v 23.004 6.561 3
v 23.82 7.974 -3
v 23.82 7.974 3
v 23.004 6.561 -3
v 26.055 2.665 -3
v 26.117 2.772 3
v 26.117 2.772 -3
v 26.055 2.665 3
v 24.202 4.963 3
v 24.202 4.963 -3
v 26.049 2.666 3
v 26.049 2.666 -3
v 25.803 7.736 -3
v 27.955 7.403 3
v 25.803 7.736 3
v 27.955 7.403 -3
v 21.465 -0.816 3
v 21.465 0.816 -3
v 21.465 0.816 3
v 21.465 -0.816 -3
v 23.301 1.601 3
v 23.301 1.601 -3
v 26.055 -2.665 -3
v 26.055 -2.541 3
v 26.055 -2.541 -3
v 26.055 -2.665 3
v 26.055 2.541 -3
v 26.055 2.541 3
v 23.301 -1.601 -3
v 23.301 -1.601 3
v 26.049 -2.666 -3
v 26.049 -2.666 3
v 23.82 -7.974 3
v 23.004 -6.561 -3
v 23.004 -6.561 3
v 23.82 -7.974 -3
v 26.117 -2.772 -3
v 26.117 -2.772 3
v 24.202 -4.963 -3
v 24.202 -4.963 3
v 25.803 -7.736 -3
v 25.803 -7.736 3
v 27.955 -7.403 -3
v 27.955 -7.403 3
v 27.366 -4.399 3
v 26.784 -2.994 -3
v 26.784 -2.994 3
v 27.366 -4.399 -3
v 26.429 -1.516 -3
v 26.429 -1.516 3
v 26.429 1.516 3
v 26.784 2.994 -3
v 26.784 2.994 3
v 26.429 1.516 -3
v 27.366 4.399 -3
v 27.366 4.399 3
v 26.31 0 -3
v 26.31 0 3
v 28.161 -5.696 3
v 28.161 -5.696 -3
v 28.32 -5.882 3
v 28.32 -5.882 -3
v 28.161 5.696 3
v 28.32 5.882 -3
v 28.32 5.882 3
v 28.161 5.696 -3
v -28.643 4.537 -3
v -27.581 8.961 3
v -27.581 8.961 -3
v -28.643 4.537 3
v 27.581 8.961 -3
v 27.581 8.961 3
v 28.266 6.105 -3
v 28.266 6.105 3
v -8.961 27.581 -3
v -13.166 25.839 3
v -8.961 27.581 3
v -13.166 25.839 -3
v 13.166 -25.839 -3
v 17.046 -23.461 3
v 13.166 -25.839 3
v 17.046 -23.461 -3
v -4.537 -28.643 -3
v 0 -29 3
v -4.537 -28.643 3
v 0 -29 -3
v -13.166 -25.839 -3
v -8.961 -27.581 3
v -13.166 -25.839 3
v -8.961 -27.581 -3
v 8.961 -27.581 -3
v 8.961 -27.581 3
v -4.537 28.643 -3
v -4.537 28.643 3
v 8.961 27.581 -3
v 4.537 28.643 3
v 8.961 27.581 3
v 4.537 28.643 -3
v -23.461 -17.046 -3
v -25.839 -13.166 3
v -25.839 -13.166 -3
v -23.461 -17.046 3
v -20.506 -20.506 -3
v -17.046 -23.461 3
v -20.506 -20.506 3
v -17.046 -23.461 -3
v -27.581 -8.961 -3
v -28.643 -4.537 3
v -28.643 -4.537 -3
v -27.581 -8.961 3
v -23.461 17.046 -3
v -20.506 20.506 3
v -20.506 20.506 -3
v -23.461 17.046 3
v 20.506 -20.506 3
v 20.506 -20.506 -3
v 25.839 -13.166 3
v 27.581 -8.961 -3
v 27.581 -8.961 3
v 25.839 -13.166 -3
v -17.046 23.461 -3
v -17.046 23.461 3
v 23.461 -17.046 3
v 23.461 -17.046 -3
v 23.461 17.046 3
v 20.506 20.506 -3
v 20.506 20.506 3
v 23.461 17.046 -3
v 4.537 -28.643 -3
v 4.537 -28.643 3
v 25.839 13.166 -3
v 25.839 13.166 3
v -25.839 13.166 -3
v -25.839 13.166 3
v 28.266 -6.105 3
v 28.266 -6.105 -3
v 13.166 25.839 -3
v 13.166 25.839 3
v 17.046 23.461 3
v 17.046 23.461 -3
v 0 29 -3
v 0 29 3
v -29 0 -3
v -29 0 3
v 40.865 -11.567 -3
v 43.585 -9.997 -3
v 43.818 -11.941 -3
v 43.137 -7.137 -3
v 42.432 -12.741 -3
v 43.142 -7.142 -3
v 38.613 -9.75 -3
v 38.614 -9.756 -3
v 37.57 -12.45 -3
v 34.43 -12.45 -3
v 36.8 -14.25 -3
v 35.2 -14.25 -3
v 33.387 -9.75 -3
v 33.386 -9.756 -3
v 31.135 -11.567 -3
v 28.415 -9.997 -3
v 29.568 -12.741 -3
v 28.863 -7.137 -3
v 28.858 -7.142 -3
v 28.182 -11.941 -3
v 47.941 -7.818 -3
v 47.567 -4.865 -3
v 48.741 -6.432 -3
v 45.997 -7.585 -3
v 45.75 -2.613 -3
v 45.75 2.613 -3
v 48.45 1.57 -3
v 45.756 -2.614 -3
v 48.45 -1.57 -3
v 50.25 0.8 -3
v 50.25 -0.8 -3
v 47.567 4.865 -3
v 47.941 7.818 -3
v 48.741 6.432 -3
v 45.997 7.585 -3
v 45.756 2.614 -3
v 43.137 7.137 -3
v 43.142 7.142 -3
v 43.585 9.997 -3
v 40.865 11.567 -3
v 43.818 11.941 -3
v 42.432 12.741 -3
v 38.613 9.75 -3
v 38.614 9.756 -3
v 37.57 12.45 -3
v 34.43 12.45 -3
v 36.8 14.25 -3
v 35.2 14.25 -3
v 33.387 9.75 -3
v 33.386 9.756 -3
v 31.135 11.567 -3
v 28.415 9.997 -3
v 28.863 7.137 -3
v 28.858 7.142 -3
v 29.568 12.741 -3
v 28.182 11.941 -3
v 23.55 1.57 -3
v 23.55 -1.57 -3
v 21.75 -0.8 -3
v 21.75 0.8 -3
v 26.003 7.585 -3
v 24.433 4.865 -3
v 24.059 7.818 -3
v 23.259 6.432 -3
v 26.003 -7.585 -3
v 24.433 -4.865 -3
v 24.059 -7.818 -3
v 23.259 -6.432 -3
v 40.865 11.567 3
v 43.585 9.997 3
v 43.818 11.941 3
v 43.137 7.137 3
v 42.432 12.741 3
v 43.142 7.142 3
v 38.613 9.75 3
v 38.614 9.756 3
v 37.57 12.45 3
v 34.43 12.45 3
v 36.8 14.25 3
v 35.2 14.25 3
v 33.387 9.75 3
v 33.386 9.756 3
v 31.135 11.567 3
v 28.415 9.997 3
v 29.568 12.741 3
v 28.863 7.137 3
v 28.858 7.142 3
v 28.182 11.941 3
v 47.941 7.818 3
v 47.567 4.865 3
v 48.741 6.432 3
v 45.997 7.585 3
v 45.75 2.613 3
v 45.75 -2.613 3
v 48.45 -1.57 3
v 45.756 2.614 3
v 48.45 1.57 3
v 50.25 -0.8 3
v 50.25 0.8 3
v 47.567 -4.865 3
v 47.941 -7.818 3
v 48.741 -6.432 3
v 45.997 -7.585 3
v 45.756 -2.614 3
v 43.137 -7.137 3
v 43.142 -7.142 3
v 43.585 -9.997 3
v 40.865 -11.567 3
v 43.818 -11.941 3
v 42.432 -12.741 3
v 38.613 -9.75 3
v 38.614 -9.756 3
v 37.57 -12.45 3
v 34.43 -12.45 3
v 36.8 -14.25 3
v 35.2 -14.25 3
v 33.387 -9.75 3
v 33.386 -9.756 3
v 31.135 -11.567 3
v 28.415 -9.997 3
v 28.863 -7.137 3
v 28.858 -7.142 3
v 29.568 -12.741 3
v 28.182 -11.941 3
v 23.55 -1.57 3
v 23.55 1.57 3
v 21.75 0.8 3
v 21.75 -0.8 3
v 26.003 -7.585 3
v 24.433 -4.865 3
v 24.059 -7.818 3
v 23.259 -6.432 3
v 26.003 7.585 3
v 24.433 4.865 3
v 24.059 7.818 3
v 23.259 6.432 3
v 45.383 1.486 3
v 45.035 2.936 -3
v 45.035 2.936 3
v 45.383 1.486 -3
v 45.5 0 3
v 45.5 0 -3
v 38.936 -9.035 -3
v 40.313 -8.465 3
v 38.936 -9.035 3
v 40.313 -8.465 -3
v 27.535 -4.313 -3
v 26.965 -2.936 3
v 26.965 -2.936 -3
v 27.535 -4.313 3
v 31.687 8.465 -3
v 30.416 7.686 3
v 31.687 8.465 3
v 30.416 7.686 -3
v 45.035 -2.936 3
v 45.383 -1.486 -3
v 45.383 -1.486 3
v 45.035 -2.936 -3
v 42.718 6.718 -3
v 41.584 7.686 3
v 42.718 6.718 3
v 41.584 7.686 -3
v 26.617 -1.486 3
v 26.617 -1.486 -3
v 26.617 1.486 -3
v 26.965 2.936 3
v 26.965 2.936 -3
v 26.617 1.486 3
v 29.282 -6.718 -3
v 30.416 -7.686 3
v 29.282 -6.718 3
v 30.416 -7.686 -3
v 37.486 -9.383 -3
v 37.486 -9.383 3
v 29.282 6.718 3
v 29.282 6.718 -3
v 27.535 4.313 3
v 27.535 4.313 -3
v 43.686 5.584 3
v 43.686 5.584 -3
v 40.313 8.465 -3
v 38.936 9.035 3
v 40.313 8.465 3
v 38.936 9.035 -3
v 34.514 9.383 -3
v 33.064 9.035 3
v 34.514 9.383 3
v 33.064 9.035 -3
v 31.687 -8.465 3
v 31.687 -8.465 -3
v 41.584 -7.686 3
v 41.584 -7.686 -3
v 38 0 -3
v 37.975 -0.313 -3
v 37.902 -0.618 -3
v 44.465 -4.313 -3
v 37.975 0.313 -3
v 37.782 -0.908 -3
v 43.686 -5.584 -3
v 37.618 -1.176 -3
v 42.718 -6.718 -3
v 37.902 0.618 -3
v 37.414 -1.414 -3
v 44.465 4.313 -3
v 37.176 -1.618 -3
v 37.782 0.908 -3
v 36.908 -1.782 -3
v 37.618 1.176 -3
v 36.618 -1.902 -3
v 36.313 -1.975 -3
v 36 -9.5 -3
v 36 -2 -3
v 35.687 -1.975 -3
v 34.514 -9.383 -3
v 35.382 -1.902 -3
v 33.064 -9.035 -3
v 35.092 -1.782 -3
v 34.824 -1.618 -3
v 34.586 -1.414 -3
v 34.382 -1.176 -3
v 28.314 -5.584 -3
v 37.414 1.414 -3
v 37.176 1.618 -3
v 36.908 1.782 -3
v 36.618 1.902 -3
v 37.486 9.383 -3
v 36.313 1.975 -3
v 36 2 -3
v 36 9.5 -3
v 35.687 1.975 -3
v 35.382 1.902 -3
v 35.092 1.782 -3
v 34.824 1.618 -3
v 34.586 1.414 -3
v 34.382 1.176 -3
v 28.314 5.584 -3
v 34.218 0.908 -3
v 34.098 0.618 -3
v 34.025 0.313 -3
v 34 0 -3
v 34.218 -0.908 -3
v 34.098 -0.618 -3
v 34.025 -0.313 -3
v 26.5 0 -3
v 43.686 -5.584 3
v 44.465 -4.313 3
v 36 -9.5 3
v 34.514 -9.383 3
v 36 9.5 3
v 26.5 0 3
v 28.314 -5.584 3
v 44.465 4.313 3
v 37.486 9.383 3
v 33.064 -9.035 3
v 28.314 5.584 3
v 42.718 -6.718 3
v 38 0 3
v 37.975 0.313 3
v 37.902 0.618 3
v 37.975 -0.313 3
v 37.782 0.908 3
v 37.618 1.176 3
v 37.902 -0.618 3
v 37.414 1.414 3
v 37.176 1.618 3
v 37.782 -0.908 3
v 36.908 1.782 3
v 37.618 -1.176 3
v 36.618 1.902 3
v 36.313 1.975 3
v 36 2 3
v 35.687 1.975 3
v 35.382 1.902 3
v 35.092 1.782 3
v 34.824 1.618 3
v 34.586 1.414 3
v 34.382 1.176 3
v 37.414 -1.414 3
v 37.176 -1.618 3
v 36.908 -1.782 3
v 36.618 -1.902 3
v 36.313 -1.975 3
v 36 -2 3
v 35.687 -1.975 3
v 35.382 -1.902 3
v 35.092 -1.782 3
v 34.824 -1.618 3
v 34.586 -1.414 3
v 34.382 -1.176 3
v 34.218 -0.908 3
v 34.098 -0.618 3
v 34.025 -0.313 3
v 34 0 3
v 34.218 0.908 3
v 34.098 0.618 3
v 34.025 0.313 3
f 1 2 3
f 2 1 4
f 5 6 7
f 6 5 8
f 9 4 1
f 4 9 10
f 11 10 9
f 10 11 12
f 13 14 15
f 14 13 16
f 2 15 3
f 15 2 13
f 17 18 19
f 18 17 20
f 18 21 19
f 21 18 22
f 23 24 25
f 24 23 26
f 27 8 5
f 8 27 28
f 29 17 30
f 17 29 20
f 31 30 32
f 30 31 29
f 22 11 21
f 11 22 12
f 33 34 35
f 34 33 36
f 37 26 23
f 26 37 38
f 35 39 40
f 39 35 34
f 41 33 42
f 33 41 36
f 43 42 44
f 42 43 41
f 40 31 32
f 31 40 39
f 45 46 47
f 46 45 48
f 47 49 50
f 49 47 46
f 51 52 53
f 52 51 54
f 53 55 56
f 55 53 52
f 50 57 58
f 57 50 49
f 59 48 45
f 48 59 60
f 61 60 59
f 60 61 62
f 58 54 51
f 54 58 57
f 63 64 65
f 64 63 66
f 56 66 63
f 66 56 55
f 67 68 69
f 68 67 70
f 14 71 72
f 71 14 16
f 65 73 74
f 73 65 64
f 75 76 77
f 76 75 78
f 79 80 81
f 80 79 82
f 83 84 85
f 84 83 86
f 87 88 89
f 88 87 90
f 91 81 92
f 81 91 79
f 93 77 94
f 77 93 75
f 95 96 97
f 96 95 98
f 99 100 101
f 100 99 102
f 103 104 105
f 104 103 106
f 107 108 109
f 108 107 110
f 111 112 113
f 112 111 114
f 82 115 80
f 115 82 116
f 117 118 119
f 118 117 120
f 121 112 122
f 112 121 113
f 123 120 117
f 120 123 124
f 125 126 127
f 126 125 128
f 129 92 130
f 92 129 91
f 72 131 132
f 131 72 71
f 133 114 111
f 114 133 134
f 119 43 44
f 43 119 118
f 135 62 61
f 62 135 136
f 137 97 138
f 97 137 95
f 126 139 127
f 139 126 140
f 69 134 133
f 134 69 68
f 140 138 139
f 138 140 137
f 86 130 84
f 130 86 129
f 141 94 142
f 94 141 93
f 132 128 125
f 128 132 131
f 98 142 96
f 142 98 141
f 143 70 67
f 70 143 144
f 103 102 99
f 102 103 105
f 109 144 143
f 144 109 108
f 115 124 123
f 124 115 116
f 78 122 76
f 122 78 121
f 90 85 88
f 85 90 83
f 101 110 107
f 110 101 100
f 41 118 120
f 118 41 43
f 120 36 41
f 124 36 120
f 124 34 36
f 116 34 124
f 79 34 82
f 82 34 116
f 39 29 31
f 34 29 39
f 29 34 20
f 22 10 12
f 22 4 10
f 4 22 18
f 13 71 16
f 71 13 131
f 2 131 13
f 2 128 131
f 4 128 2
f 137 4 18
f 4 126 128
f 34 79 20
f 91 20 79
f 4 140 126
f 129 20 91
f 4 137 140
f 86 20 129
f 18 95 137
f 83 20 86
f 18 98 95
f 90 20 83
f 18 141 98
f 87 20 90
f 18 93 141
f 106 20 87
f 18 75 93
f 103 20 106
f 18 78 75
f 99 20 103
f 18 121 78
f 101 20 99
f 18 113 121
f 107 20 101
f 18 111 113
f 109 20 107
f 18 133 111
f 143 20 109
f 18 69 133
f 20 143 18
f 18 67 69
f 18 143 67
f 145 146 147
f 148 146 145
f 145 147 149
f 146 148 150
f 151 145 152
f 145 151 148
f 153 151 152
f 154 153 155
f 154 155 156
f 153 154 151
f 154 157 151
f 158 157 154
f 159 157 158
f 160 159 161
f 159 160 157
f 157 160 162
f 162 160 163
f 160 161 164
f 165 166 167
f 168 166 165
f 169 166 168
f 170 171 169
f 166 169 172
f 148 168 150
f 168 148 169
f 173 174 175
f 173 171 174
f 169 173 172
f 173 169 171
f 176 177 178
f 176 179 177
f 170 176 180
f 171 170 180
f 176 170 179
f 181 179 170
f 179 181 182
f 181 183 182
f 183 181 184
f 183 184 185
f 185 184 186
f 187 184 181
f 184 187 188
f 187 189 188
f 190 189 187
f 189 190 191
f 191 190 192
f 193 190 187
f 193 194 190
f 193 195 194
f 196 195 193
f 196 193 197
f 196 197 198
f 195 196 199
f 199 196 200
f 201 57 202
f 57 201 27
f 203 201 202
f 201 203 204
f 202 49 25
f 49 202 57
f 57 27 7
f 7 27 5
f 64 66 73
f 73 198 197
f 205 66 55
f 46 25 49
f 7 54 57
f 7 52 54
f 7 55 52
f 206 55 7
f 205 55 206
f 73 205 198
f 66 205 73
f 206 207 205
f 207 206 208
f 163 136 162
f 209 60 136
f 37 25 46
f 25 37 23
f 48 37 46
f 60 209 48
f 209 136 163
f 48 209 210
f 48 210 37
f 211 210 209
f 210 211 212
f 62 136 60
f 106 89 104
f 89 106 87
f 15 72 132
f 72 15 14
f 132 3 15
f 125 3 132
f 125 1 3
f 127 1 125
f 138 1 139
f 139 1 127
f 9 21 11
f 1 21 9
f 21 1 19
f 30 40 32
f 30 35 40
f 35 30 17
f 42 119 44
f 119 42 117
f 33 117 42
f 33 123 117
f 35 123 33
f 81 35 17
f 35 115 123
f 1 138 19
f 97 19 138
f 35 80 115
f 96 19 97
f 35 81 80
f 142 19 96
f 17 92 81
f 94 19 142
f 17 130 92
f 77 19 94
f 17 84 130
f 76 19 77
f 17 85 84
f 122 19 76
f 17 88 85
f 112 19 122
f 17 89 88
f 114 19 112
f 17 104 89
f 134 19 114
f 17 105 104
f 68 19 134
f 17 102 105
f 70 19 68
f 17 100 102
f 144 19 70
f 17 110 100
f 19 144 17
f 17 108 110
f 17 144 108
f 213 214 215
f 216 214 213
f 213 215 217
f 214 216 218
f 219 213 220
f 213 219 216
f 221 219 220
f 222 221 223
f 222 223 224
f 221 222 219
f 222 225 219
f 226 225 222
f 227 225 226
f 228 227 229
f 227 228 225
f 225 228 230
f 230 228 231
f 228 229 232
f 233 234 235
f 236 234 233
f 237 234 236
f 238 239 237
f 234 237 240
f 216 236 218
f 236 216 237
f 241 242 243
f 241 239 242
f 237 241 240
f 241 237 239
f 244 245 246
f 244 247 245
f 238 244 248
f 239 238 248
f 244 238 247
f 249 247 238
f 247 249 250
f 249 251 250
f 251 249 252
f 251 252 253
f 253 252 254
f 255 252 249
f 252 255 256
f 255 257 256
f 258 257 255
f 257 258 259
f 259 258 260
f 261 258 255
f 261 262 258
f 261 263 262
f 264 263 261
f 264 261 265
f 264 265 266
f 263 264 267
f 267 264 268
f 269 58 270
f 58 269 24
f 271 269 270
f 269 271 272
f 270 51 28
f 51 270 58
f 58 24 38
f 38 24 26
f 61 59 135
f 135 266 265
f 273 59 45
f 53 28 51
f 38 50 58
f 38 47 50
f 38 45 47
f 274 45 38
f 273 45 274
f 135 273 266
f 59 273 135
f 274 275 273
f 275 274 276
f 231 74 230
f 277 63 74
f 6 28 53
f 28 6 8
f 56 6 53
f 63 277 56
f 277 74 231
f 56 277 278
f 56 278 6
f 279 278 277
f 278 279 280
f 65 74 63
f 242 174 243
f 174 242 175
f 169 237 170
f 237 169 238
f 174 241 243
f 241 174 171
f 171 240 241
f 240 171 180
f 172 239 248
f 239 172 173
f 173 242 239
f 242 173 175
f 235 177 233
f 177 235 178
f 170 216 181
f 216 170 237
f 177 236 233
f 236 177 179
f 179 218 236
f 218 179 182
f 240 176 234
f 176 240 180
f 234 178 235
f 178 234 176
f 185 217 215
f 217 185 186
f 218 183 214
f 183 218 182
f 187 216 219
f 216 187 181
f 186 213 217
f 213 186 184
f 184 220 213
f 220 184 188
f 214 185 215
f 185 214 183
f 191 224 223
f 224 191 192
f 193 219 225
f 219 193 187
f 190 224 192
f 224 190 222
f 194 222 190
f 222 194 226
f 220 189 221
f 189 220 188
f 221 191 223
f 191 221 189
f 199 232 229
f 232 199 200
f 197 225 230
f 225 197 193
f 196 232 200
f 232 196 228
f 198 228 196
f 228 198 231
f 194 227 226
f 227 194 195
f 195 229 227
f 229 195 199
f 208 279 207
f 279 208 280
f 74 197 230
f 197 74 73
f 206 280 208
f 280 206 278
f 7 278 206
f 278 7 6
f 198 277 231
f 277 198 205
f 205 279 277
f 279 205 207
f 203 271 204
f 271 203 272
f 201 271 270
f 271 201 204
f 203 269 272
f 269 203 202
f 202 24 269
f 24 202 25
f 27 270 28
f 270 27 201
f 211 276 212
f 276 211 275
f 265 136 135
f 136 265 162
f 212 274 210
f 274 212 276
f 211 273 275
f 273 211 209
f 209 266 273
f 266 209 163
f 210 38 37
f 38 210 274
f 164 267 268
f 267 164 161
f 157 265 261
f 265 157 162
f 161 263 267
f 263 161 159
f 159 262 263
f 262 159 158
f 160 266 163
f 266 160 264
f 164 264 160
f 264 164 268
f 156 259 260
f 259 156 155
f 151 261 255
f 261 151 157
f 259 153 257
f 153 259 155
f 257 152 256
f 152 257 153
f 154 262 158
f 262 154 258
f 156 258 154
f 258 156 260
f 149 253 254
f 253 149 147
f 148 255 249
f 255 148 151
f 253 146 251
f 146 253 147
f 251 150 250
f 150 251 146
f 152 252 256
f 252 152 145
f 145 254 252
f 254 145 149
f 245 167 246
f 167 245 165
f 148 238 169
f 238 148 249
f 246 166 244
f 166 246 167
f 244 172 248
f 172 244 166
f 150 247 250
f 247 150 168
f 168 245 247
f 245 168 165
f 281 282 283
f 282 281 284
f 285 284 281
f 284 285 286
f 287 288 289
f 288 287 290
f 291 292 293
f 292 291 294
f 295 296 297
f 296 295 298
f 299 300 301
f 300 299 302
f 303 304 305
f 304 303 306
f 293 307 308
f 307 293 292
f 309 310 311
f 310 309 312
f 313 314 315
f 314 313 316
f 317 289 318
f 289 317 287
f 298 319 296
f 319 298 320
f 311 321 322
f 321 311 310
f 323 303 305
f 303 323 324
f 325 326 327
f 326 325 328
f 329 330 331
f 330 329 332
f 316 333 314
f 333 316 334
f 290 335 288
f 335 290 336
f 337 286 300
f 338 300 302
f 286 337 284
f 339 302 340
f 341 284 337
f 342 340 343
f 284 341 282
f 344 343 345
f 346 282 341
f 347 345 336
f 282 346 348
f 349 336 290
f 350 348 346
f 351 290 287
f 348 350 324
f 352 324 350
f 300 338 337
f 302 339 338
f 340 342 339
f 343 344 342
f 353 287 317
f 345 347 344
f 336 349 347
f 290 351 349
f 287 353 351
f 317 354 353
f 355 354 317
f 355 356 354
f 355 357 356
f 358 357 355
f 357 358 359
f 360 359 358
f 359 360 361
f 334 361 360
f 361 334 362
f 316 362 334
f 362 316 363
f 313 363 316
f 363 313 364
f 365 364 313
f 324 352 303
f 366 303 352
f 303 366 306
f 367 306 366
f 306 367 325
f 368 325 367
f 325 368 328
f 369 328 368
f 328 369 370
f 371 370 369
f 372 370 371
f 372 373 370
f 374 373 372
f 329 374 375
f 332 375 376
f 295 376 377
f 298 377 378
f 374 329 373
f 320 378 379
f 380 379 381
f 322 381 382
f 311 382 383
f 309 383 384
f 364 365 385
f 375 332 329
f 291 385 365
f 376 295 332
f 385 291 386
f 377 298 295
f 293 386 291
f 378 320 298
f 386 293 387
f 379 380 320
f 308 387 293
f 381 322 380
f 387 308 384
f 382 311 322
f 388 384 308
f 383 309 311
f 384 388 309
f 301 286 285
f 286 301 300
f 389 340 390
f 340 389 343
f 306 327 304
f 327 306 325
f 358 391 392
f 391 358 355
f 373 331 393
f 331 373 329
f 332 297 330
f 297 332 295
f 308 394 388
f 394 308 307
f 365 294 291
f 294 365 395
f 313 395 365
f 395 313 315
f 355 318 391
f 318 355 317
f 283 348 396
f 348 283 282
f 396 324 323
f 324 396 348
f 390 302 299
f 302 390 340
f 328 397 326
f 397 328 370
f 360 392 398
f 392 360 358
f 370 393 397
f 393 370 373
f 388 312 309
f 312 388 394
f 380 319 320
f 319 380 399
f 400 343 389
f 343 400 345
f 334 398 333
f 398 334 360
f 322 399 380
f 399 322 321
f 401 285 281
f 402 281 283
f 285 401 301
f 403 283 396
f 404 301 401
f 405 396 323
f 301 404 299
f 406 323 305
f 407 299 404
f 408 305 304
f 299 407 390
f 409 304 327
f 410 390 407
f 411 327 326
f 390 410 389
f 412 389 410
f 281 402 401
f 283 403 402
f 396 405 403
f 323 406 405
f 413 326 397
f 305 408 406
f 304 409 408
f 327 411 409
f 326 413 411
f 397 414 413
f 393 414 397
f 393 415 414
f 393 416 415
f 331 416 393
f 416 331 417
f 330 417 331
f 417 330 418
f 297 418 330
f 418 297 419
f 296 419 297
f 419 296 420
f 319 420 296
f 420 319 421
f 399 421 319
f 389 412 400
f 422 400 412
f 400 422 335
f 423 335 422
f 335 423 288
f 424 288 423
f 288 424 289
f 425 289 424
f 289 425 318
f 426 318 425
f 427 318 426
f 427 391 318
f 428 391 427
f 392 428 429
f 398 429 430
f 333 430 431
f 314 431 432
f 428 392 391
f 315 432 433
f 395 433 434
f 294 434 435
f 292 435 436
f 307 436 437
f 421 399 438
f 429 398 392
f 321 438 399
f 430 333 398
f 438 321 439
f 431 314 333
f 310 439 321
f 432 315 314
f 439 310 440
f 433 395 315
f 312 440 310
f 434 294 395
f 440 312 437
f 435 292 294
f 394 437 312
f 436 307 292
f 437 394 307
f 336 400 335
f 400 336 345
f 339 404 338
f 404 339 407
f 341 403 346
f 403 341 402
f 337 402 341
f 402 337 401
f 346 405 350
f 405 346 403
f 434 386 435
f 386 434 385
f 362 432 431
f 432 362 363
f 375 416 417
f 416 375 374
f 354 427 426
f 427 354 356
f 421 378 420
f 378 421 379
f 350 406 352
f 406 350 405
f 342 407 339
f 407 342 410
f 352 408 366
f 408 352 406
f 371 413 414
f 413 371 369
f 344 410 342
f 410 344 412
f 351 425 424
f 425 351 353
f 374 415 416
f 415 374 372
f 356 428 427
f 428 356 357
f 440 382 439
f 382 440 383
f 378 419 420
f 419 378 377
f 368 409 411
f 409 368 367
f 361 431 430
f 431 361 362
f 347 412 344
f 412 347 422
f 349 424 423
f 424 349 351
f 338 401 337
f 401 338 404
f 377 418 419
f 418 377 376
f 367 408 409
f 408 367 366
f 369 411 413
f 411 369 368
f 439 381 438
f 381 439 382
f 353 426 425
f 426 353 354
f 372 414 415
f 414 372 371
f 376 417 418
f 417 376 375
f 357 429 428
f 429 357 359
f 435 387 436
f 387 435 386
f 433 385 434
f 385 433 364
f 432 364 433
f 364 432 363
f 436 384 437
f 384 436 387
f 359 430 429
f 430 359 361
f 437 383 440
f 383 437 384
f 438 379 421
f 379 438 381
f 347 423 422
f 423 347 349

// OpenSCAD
// --- ANIMATION PARAMETERS ---
// Go to: View -> Animate. Set FPS to 30, Steps to 100 or 200.

$fn = 40; 

// Base gear properties (The Cutter)
teeth = 12;
modulus = 2;
thickness = 6;
bore = 4;

// Orbital properties
orbital_radius = 36; // Lowered to 36 so the gears actually intersect!
orbit_speed = 1;     
spin_speed = 4;      // Must be mathematically proportional to generate real teeth

// --- GENERATIVE SCULPTING EXECUTION ---

// 1. The Sculpted Sun Cylinder
color("red")
difference() {
    // The blank cylinder we want to carve
    cylinder(d=58, h=thickness, center=true);
    
    // We loop from 0 to the current animation time ($t)
    // "steps = 150" controls how smooth/dense the cut cuts are.
    let(steps = 150)
    for (step = [0 : steps * $t]) {
        let(progress = step / steps) // Simulated time from 0.0 to $t
        
        // Place a destructive cutter gear at this historical frame
        planetary_gear_position(orbital_radius, orbit_speed, spin_speed, progress) {
            // We scale the cutter up by 1.02 just to add a tiny bit of backlash clearance
            scale([1.02, 1.02, 1.1]) 
            gear(teeth, modulus, thickness, bore, 0, thickness);
        }
    }
}

// 2. The Visual Planet Gear (The one you see moving in real-time)
planetary_gear_position(orbital_radius, orbit_speed, spin_speed, $t) {
    gear(teeth, modulus, thickness, bore, 10, thickness);
}


// --- POSITIONING MODULE ---
// Replaced $t with a custom 'time_val' variable so we can loop through history
module planetary_gear_position(radius, o_speed, s_speed, time_val) {
    rotate([0, 0, time_val * 360 * o_speed]) 
    translate([radius, 0, 0]) 
    rotate([0, 0, time_val * 360 * s_speed]) 
    children(); 
}

// --- BASE GEAR MODULES ---
module gear(num_teeth, mod, thick, bore, hub_dia, hub_thick) {
    pitch_dia = num_teeth * mod;
    root_dia = pitch_dia - (2.5 * mod);
    
    color("LightSeaGreen")
    difference() {
        union() {
            cylinder(d = root_dia, h = thick, center = true);
            for (i = [0 : num_teeth - 1]) {
                rotate([0, 0, i * (360 / num_teeth)])
                translate([pitch_dia / 2, 0, 0])
                tooth(mod, thick);
            }
            if (hub_dia > bore) {
                cylinder(d = hub_dia, h = hub_thick, center = true);
            }
        }
        if (bore > 0) cylinder(d = bore, h = max(thick, hub_thick) + 2, center = true);
    }
}

module tooth(mod, thick) {
    pitch_width = mod * 1.57; 
    outer_width = mod * 0.8;
    height = mod * 2.25;
    
    translate([-height/2, 0, -thick/2])
    linear_extrude(height = thick)
    polygon(points = [[0, -pitch_width/1.2], [height * 0.6, -pitch_width/2], [height, -outer_width/2], [height, outer_width/2], [height * 0.6, pitch_width/2], [0, pitch_width/1.2]]);
}
